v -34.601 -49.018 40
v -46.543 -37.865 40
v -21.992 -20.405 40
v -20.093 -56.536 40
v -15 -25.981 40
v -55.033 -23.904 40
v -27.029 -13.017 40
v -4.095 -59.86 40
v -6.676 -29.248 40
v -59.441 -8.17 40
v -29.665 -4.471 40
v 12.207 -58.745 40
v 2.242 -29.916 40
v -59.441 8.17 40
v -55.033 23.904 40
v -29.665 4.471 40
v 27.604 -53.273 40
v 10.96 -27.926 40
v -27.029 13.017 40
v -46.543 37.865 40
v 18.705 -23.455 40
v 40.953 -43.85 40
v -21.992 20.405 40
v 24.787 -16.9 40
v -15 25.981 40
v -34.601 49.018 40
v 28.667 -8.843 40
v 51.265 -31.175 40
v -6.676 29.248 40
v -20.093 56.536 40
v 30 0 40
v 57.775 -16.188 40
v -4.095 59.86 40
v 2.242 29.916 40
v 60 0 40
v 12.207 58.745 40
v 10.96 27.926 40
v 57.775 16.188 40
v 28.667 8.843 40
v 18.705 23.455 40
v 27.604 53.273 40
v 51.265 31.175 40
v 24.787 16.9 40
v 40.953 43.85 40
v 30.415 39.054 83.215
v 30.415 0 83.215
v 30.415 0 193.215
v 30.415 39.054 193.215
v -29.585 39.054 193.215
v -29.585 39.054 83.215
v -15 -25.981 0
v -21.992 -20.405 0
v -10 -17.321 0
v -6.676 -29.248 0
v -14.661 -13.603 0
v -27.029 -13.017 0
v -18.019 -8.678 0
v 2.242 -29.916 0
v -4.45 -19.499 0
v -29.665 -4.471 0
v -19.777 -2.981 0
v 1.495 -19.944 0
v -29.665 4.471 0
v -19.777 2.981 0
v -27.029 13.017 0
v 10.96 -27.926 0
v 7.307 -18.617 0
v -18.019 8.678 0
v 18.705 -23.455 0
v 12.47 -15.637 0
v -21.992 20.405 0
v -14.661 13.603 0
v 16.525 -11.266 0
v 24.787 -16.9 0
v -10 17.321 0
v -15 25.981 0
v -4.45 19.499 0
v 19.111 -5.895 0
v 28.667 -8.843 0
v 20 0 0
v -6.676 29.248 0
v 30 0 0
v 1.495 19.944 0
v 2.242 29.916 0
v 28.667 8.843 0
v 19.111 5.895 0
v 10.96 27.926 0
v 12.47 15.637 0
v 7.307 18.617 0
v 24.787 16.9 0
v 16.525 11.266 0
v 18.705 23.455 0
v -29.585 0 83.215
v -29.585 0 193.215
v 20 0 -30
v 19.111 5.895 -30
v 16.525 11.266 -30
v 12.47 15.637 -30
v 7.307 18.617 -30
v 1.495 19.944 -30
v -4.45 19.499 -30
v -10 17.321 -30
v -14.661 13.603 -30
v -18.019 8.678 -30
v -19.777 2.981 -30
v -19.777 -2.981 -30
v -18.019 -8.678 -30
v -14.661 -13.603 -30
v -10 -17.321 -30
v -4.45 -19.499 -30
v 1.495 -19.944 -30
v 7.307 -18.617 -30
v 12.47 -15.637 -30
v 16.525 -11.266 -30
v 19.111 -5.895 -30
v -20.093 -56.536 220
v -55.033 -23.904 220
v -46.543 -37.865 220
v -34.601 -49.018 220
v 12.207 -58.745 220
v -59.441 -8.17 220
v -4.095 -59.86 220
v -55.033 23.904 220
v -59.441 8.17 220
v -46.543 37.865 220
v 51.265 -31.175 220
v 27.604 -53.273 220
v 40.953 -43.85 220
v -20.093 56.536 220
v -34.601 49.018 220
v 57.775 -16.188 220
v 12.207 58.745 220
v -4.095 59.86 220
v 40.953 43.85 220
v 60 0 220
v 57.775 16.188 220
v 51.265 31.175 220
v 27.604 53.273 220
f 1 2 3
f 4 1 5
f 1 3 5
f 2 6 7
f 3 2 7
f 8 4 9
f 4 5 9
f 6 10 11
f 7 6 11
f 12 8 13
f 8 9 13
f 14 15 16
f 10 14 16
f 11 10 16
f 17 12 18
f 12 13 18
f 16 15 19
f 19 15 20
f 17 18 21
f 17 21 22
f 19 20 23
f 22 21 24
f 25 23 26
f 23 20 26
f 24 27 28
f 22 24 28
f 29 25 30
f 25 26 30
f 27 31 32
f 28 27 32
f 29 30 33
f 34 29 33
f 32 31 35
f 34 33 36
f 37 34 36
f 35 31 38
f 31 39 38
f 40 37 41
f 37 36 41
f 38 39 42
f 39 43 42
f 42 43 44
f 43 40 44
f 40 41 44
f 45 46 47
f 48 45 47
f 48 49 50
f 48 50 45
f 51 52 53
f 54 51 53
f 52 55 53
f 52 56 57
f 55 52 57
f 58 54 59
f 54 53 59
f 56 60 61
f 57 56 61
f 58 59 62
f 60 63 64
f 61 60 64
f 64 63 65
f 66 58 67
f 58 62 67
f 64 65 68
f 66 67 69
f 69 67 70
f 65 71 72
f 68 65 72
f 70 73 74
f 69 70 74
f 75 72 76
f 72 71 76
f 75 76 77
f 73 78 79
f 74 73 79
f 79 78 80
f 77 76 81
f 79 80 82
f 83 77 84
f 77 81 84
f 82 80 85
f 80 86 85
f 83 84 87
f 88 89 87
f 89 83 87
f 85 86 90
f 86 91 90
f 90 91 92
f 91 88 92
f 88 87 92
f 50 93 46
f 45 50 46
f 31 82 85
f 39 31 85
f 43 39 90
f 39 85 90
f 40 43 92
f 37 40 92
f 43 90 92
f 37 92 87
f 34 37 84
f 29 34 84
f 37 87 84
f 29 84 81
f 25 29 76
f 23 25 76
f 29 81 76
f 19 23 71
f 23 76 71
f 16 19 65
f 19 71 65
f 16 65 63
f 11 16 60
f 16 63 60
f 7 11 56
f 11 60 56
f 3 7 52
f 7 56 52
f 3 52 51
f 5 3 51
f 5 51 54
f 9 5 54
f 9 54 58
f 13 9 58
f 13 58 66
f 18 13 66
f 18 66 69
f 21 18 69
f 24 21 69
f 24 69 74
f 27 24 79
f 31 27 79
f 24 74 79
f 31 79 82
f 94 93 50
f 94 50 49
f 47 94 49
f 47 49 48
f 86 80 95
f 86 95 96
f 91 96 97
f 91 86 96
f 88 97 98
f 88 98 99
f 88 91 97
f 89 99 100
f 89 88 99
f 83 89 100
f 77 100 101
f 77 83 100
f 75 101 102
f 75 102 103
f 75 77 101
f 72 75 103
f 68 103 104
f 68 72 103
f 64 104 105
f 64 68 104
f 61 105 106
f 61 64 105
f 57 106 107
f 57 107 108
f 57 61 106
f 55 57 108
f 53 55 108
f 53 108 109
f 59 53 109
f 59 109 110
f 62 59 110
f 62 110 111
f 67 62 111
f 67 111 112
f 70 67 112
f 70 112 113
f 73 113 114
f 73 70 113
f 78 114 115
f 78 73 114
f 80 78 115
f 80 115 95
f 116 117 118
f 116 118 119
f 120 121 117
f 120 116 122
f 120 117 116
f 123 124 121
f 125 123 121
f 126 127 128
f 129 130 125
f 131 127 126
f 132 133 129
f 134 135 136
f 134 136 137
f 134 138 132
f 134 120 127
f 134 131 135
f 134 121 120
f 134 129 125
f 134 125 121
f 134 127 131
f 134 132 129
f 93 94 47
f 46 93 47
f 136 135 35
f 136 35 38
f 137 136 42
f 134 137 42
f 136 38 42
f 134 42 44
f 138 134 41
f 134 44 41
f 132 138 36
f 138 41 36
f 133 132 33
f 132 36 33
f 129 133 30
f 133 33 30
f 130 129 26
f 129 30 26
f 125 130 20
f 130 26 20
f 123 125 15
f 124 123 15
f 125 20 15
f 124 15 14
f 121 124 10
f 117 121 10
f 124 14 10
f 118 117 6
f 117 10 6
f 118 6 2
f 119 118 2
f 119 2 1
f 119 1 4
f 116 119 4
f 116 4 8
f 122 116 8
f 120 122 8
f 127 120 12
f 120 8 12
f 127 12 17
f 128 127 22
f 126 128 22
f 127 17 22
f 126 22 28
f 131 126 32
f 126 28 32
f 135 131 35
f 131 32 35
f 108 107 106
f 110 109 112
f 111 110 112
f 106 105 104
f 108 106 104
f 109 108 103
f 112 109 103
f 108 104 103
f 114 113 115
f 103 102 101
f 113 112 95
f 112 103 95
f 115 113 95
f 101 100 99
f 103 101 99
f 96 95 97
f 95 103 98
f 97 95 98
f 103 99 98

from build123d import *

# Parameters (mm, degrees)
F0_R     = 20
F1_DEPTH = 30
F2_R     = 30
F3_DEPTH = 40
F4_R     = 60
F5_DEPTH = 180
F6_W     = 60
F6_H     = 110
F7_DEPTH = 39.05434


with BuildPart() as f1:
    # F0 (on Top) → F1 (new body)
    with BuildSketch(Plane.XY):
        Circle(F0_R)
    extrude(amount=-F1_DEPTH)

    # F2 (on Top) → F3 (join)
    with BuildSketch(Plane.XY):
        Circle(F2_R)
    extrude(amount=F3_DEPTH)

    # F4 (on face) → F5 (join)
    with BuildSketch(Plane.XY.offset(40)):
        Circle(F4_R)
    extrude(amount=F5_DEPTH)

    # F6 (on Front) → F7 (cut)
    with BuildSketch(Plane.XZ):
        with Locations((0.414748, 138.215205)):
            Rectangle(F6_W, F6_H)
    extrude(amount=-F7_DEPTH, mode=Mode.SUBTRACT)


solid = f1.part
